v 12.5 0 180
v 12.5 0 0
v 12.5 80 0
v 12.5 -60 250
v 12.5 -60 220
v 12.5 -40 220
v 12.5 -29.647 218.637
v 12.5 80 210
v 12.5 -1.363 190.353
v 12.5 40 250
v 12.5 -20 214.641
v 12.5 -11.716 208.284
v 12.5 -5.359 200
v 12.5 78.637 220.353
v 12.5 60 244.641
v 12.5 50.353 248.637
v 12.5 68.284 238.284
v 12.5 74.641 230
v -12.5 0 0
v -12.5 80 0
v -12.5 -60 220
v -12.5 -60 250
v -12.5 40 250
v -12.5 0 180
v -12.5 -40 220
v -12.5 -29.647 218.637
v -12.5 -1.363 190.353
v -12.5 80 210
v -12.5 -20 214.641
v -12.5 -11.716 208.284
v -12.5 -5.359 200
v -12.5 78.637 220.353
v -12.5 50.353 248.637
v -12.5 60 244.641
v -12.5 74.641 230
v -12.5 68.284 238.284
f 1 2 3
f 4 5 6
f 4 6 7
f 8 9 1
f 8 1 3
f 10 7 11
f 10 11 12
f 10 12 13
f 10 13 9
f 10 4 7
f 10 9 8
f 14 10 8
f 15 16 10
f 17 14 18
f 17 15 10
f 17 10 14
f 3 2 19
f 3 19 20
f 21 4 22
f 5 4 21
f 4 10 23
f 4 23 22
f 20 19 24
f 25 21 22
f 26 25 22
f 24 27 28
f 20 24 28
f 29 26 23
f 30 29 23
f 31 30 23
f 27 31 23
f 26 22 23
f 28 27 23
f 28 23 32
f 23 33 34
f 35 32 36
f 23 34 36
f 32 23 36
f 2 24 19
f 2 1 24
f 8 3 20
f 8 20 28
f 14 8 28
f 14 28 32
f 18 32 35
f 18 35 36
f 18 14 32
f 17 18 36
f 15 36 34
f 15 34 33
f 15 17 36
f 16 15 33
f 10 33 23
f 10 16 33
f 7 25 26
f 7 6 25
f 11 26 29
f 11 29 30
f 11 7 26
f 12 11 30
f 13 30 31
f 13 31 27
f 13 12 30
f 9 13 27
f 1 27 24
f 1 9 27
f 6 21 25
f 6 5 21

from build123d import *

# Parameters (mm, degrees)
F1_DEPTH = 12.5


with BuildPart() as f1:
    # F0 (on Right) → F1 (new body, symmetric)
    with BuildSketch(Plane.YZ):
        with BuildLine():
            Line((0, 180), (0, 0))
            Line((0, 0), (80, 0))
            Line((80, 0), (80, 210))
            ThreePointArc((80, 210), (68.284271, 238.284271), (40, 250))
            Line((40, 250), (-60, 250))
            Line((-60, 250), (-60, 220))
            Line((-60, 220), (-40, 220))
            ThreePointArc((-40, 220), (-11.715729, 208.284271), (0, 180))
        make_face()
    extrude(amount=F1_DEPTH, both=True)


solid = f1.part
